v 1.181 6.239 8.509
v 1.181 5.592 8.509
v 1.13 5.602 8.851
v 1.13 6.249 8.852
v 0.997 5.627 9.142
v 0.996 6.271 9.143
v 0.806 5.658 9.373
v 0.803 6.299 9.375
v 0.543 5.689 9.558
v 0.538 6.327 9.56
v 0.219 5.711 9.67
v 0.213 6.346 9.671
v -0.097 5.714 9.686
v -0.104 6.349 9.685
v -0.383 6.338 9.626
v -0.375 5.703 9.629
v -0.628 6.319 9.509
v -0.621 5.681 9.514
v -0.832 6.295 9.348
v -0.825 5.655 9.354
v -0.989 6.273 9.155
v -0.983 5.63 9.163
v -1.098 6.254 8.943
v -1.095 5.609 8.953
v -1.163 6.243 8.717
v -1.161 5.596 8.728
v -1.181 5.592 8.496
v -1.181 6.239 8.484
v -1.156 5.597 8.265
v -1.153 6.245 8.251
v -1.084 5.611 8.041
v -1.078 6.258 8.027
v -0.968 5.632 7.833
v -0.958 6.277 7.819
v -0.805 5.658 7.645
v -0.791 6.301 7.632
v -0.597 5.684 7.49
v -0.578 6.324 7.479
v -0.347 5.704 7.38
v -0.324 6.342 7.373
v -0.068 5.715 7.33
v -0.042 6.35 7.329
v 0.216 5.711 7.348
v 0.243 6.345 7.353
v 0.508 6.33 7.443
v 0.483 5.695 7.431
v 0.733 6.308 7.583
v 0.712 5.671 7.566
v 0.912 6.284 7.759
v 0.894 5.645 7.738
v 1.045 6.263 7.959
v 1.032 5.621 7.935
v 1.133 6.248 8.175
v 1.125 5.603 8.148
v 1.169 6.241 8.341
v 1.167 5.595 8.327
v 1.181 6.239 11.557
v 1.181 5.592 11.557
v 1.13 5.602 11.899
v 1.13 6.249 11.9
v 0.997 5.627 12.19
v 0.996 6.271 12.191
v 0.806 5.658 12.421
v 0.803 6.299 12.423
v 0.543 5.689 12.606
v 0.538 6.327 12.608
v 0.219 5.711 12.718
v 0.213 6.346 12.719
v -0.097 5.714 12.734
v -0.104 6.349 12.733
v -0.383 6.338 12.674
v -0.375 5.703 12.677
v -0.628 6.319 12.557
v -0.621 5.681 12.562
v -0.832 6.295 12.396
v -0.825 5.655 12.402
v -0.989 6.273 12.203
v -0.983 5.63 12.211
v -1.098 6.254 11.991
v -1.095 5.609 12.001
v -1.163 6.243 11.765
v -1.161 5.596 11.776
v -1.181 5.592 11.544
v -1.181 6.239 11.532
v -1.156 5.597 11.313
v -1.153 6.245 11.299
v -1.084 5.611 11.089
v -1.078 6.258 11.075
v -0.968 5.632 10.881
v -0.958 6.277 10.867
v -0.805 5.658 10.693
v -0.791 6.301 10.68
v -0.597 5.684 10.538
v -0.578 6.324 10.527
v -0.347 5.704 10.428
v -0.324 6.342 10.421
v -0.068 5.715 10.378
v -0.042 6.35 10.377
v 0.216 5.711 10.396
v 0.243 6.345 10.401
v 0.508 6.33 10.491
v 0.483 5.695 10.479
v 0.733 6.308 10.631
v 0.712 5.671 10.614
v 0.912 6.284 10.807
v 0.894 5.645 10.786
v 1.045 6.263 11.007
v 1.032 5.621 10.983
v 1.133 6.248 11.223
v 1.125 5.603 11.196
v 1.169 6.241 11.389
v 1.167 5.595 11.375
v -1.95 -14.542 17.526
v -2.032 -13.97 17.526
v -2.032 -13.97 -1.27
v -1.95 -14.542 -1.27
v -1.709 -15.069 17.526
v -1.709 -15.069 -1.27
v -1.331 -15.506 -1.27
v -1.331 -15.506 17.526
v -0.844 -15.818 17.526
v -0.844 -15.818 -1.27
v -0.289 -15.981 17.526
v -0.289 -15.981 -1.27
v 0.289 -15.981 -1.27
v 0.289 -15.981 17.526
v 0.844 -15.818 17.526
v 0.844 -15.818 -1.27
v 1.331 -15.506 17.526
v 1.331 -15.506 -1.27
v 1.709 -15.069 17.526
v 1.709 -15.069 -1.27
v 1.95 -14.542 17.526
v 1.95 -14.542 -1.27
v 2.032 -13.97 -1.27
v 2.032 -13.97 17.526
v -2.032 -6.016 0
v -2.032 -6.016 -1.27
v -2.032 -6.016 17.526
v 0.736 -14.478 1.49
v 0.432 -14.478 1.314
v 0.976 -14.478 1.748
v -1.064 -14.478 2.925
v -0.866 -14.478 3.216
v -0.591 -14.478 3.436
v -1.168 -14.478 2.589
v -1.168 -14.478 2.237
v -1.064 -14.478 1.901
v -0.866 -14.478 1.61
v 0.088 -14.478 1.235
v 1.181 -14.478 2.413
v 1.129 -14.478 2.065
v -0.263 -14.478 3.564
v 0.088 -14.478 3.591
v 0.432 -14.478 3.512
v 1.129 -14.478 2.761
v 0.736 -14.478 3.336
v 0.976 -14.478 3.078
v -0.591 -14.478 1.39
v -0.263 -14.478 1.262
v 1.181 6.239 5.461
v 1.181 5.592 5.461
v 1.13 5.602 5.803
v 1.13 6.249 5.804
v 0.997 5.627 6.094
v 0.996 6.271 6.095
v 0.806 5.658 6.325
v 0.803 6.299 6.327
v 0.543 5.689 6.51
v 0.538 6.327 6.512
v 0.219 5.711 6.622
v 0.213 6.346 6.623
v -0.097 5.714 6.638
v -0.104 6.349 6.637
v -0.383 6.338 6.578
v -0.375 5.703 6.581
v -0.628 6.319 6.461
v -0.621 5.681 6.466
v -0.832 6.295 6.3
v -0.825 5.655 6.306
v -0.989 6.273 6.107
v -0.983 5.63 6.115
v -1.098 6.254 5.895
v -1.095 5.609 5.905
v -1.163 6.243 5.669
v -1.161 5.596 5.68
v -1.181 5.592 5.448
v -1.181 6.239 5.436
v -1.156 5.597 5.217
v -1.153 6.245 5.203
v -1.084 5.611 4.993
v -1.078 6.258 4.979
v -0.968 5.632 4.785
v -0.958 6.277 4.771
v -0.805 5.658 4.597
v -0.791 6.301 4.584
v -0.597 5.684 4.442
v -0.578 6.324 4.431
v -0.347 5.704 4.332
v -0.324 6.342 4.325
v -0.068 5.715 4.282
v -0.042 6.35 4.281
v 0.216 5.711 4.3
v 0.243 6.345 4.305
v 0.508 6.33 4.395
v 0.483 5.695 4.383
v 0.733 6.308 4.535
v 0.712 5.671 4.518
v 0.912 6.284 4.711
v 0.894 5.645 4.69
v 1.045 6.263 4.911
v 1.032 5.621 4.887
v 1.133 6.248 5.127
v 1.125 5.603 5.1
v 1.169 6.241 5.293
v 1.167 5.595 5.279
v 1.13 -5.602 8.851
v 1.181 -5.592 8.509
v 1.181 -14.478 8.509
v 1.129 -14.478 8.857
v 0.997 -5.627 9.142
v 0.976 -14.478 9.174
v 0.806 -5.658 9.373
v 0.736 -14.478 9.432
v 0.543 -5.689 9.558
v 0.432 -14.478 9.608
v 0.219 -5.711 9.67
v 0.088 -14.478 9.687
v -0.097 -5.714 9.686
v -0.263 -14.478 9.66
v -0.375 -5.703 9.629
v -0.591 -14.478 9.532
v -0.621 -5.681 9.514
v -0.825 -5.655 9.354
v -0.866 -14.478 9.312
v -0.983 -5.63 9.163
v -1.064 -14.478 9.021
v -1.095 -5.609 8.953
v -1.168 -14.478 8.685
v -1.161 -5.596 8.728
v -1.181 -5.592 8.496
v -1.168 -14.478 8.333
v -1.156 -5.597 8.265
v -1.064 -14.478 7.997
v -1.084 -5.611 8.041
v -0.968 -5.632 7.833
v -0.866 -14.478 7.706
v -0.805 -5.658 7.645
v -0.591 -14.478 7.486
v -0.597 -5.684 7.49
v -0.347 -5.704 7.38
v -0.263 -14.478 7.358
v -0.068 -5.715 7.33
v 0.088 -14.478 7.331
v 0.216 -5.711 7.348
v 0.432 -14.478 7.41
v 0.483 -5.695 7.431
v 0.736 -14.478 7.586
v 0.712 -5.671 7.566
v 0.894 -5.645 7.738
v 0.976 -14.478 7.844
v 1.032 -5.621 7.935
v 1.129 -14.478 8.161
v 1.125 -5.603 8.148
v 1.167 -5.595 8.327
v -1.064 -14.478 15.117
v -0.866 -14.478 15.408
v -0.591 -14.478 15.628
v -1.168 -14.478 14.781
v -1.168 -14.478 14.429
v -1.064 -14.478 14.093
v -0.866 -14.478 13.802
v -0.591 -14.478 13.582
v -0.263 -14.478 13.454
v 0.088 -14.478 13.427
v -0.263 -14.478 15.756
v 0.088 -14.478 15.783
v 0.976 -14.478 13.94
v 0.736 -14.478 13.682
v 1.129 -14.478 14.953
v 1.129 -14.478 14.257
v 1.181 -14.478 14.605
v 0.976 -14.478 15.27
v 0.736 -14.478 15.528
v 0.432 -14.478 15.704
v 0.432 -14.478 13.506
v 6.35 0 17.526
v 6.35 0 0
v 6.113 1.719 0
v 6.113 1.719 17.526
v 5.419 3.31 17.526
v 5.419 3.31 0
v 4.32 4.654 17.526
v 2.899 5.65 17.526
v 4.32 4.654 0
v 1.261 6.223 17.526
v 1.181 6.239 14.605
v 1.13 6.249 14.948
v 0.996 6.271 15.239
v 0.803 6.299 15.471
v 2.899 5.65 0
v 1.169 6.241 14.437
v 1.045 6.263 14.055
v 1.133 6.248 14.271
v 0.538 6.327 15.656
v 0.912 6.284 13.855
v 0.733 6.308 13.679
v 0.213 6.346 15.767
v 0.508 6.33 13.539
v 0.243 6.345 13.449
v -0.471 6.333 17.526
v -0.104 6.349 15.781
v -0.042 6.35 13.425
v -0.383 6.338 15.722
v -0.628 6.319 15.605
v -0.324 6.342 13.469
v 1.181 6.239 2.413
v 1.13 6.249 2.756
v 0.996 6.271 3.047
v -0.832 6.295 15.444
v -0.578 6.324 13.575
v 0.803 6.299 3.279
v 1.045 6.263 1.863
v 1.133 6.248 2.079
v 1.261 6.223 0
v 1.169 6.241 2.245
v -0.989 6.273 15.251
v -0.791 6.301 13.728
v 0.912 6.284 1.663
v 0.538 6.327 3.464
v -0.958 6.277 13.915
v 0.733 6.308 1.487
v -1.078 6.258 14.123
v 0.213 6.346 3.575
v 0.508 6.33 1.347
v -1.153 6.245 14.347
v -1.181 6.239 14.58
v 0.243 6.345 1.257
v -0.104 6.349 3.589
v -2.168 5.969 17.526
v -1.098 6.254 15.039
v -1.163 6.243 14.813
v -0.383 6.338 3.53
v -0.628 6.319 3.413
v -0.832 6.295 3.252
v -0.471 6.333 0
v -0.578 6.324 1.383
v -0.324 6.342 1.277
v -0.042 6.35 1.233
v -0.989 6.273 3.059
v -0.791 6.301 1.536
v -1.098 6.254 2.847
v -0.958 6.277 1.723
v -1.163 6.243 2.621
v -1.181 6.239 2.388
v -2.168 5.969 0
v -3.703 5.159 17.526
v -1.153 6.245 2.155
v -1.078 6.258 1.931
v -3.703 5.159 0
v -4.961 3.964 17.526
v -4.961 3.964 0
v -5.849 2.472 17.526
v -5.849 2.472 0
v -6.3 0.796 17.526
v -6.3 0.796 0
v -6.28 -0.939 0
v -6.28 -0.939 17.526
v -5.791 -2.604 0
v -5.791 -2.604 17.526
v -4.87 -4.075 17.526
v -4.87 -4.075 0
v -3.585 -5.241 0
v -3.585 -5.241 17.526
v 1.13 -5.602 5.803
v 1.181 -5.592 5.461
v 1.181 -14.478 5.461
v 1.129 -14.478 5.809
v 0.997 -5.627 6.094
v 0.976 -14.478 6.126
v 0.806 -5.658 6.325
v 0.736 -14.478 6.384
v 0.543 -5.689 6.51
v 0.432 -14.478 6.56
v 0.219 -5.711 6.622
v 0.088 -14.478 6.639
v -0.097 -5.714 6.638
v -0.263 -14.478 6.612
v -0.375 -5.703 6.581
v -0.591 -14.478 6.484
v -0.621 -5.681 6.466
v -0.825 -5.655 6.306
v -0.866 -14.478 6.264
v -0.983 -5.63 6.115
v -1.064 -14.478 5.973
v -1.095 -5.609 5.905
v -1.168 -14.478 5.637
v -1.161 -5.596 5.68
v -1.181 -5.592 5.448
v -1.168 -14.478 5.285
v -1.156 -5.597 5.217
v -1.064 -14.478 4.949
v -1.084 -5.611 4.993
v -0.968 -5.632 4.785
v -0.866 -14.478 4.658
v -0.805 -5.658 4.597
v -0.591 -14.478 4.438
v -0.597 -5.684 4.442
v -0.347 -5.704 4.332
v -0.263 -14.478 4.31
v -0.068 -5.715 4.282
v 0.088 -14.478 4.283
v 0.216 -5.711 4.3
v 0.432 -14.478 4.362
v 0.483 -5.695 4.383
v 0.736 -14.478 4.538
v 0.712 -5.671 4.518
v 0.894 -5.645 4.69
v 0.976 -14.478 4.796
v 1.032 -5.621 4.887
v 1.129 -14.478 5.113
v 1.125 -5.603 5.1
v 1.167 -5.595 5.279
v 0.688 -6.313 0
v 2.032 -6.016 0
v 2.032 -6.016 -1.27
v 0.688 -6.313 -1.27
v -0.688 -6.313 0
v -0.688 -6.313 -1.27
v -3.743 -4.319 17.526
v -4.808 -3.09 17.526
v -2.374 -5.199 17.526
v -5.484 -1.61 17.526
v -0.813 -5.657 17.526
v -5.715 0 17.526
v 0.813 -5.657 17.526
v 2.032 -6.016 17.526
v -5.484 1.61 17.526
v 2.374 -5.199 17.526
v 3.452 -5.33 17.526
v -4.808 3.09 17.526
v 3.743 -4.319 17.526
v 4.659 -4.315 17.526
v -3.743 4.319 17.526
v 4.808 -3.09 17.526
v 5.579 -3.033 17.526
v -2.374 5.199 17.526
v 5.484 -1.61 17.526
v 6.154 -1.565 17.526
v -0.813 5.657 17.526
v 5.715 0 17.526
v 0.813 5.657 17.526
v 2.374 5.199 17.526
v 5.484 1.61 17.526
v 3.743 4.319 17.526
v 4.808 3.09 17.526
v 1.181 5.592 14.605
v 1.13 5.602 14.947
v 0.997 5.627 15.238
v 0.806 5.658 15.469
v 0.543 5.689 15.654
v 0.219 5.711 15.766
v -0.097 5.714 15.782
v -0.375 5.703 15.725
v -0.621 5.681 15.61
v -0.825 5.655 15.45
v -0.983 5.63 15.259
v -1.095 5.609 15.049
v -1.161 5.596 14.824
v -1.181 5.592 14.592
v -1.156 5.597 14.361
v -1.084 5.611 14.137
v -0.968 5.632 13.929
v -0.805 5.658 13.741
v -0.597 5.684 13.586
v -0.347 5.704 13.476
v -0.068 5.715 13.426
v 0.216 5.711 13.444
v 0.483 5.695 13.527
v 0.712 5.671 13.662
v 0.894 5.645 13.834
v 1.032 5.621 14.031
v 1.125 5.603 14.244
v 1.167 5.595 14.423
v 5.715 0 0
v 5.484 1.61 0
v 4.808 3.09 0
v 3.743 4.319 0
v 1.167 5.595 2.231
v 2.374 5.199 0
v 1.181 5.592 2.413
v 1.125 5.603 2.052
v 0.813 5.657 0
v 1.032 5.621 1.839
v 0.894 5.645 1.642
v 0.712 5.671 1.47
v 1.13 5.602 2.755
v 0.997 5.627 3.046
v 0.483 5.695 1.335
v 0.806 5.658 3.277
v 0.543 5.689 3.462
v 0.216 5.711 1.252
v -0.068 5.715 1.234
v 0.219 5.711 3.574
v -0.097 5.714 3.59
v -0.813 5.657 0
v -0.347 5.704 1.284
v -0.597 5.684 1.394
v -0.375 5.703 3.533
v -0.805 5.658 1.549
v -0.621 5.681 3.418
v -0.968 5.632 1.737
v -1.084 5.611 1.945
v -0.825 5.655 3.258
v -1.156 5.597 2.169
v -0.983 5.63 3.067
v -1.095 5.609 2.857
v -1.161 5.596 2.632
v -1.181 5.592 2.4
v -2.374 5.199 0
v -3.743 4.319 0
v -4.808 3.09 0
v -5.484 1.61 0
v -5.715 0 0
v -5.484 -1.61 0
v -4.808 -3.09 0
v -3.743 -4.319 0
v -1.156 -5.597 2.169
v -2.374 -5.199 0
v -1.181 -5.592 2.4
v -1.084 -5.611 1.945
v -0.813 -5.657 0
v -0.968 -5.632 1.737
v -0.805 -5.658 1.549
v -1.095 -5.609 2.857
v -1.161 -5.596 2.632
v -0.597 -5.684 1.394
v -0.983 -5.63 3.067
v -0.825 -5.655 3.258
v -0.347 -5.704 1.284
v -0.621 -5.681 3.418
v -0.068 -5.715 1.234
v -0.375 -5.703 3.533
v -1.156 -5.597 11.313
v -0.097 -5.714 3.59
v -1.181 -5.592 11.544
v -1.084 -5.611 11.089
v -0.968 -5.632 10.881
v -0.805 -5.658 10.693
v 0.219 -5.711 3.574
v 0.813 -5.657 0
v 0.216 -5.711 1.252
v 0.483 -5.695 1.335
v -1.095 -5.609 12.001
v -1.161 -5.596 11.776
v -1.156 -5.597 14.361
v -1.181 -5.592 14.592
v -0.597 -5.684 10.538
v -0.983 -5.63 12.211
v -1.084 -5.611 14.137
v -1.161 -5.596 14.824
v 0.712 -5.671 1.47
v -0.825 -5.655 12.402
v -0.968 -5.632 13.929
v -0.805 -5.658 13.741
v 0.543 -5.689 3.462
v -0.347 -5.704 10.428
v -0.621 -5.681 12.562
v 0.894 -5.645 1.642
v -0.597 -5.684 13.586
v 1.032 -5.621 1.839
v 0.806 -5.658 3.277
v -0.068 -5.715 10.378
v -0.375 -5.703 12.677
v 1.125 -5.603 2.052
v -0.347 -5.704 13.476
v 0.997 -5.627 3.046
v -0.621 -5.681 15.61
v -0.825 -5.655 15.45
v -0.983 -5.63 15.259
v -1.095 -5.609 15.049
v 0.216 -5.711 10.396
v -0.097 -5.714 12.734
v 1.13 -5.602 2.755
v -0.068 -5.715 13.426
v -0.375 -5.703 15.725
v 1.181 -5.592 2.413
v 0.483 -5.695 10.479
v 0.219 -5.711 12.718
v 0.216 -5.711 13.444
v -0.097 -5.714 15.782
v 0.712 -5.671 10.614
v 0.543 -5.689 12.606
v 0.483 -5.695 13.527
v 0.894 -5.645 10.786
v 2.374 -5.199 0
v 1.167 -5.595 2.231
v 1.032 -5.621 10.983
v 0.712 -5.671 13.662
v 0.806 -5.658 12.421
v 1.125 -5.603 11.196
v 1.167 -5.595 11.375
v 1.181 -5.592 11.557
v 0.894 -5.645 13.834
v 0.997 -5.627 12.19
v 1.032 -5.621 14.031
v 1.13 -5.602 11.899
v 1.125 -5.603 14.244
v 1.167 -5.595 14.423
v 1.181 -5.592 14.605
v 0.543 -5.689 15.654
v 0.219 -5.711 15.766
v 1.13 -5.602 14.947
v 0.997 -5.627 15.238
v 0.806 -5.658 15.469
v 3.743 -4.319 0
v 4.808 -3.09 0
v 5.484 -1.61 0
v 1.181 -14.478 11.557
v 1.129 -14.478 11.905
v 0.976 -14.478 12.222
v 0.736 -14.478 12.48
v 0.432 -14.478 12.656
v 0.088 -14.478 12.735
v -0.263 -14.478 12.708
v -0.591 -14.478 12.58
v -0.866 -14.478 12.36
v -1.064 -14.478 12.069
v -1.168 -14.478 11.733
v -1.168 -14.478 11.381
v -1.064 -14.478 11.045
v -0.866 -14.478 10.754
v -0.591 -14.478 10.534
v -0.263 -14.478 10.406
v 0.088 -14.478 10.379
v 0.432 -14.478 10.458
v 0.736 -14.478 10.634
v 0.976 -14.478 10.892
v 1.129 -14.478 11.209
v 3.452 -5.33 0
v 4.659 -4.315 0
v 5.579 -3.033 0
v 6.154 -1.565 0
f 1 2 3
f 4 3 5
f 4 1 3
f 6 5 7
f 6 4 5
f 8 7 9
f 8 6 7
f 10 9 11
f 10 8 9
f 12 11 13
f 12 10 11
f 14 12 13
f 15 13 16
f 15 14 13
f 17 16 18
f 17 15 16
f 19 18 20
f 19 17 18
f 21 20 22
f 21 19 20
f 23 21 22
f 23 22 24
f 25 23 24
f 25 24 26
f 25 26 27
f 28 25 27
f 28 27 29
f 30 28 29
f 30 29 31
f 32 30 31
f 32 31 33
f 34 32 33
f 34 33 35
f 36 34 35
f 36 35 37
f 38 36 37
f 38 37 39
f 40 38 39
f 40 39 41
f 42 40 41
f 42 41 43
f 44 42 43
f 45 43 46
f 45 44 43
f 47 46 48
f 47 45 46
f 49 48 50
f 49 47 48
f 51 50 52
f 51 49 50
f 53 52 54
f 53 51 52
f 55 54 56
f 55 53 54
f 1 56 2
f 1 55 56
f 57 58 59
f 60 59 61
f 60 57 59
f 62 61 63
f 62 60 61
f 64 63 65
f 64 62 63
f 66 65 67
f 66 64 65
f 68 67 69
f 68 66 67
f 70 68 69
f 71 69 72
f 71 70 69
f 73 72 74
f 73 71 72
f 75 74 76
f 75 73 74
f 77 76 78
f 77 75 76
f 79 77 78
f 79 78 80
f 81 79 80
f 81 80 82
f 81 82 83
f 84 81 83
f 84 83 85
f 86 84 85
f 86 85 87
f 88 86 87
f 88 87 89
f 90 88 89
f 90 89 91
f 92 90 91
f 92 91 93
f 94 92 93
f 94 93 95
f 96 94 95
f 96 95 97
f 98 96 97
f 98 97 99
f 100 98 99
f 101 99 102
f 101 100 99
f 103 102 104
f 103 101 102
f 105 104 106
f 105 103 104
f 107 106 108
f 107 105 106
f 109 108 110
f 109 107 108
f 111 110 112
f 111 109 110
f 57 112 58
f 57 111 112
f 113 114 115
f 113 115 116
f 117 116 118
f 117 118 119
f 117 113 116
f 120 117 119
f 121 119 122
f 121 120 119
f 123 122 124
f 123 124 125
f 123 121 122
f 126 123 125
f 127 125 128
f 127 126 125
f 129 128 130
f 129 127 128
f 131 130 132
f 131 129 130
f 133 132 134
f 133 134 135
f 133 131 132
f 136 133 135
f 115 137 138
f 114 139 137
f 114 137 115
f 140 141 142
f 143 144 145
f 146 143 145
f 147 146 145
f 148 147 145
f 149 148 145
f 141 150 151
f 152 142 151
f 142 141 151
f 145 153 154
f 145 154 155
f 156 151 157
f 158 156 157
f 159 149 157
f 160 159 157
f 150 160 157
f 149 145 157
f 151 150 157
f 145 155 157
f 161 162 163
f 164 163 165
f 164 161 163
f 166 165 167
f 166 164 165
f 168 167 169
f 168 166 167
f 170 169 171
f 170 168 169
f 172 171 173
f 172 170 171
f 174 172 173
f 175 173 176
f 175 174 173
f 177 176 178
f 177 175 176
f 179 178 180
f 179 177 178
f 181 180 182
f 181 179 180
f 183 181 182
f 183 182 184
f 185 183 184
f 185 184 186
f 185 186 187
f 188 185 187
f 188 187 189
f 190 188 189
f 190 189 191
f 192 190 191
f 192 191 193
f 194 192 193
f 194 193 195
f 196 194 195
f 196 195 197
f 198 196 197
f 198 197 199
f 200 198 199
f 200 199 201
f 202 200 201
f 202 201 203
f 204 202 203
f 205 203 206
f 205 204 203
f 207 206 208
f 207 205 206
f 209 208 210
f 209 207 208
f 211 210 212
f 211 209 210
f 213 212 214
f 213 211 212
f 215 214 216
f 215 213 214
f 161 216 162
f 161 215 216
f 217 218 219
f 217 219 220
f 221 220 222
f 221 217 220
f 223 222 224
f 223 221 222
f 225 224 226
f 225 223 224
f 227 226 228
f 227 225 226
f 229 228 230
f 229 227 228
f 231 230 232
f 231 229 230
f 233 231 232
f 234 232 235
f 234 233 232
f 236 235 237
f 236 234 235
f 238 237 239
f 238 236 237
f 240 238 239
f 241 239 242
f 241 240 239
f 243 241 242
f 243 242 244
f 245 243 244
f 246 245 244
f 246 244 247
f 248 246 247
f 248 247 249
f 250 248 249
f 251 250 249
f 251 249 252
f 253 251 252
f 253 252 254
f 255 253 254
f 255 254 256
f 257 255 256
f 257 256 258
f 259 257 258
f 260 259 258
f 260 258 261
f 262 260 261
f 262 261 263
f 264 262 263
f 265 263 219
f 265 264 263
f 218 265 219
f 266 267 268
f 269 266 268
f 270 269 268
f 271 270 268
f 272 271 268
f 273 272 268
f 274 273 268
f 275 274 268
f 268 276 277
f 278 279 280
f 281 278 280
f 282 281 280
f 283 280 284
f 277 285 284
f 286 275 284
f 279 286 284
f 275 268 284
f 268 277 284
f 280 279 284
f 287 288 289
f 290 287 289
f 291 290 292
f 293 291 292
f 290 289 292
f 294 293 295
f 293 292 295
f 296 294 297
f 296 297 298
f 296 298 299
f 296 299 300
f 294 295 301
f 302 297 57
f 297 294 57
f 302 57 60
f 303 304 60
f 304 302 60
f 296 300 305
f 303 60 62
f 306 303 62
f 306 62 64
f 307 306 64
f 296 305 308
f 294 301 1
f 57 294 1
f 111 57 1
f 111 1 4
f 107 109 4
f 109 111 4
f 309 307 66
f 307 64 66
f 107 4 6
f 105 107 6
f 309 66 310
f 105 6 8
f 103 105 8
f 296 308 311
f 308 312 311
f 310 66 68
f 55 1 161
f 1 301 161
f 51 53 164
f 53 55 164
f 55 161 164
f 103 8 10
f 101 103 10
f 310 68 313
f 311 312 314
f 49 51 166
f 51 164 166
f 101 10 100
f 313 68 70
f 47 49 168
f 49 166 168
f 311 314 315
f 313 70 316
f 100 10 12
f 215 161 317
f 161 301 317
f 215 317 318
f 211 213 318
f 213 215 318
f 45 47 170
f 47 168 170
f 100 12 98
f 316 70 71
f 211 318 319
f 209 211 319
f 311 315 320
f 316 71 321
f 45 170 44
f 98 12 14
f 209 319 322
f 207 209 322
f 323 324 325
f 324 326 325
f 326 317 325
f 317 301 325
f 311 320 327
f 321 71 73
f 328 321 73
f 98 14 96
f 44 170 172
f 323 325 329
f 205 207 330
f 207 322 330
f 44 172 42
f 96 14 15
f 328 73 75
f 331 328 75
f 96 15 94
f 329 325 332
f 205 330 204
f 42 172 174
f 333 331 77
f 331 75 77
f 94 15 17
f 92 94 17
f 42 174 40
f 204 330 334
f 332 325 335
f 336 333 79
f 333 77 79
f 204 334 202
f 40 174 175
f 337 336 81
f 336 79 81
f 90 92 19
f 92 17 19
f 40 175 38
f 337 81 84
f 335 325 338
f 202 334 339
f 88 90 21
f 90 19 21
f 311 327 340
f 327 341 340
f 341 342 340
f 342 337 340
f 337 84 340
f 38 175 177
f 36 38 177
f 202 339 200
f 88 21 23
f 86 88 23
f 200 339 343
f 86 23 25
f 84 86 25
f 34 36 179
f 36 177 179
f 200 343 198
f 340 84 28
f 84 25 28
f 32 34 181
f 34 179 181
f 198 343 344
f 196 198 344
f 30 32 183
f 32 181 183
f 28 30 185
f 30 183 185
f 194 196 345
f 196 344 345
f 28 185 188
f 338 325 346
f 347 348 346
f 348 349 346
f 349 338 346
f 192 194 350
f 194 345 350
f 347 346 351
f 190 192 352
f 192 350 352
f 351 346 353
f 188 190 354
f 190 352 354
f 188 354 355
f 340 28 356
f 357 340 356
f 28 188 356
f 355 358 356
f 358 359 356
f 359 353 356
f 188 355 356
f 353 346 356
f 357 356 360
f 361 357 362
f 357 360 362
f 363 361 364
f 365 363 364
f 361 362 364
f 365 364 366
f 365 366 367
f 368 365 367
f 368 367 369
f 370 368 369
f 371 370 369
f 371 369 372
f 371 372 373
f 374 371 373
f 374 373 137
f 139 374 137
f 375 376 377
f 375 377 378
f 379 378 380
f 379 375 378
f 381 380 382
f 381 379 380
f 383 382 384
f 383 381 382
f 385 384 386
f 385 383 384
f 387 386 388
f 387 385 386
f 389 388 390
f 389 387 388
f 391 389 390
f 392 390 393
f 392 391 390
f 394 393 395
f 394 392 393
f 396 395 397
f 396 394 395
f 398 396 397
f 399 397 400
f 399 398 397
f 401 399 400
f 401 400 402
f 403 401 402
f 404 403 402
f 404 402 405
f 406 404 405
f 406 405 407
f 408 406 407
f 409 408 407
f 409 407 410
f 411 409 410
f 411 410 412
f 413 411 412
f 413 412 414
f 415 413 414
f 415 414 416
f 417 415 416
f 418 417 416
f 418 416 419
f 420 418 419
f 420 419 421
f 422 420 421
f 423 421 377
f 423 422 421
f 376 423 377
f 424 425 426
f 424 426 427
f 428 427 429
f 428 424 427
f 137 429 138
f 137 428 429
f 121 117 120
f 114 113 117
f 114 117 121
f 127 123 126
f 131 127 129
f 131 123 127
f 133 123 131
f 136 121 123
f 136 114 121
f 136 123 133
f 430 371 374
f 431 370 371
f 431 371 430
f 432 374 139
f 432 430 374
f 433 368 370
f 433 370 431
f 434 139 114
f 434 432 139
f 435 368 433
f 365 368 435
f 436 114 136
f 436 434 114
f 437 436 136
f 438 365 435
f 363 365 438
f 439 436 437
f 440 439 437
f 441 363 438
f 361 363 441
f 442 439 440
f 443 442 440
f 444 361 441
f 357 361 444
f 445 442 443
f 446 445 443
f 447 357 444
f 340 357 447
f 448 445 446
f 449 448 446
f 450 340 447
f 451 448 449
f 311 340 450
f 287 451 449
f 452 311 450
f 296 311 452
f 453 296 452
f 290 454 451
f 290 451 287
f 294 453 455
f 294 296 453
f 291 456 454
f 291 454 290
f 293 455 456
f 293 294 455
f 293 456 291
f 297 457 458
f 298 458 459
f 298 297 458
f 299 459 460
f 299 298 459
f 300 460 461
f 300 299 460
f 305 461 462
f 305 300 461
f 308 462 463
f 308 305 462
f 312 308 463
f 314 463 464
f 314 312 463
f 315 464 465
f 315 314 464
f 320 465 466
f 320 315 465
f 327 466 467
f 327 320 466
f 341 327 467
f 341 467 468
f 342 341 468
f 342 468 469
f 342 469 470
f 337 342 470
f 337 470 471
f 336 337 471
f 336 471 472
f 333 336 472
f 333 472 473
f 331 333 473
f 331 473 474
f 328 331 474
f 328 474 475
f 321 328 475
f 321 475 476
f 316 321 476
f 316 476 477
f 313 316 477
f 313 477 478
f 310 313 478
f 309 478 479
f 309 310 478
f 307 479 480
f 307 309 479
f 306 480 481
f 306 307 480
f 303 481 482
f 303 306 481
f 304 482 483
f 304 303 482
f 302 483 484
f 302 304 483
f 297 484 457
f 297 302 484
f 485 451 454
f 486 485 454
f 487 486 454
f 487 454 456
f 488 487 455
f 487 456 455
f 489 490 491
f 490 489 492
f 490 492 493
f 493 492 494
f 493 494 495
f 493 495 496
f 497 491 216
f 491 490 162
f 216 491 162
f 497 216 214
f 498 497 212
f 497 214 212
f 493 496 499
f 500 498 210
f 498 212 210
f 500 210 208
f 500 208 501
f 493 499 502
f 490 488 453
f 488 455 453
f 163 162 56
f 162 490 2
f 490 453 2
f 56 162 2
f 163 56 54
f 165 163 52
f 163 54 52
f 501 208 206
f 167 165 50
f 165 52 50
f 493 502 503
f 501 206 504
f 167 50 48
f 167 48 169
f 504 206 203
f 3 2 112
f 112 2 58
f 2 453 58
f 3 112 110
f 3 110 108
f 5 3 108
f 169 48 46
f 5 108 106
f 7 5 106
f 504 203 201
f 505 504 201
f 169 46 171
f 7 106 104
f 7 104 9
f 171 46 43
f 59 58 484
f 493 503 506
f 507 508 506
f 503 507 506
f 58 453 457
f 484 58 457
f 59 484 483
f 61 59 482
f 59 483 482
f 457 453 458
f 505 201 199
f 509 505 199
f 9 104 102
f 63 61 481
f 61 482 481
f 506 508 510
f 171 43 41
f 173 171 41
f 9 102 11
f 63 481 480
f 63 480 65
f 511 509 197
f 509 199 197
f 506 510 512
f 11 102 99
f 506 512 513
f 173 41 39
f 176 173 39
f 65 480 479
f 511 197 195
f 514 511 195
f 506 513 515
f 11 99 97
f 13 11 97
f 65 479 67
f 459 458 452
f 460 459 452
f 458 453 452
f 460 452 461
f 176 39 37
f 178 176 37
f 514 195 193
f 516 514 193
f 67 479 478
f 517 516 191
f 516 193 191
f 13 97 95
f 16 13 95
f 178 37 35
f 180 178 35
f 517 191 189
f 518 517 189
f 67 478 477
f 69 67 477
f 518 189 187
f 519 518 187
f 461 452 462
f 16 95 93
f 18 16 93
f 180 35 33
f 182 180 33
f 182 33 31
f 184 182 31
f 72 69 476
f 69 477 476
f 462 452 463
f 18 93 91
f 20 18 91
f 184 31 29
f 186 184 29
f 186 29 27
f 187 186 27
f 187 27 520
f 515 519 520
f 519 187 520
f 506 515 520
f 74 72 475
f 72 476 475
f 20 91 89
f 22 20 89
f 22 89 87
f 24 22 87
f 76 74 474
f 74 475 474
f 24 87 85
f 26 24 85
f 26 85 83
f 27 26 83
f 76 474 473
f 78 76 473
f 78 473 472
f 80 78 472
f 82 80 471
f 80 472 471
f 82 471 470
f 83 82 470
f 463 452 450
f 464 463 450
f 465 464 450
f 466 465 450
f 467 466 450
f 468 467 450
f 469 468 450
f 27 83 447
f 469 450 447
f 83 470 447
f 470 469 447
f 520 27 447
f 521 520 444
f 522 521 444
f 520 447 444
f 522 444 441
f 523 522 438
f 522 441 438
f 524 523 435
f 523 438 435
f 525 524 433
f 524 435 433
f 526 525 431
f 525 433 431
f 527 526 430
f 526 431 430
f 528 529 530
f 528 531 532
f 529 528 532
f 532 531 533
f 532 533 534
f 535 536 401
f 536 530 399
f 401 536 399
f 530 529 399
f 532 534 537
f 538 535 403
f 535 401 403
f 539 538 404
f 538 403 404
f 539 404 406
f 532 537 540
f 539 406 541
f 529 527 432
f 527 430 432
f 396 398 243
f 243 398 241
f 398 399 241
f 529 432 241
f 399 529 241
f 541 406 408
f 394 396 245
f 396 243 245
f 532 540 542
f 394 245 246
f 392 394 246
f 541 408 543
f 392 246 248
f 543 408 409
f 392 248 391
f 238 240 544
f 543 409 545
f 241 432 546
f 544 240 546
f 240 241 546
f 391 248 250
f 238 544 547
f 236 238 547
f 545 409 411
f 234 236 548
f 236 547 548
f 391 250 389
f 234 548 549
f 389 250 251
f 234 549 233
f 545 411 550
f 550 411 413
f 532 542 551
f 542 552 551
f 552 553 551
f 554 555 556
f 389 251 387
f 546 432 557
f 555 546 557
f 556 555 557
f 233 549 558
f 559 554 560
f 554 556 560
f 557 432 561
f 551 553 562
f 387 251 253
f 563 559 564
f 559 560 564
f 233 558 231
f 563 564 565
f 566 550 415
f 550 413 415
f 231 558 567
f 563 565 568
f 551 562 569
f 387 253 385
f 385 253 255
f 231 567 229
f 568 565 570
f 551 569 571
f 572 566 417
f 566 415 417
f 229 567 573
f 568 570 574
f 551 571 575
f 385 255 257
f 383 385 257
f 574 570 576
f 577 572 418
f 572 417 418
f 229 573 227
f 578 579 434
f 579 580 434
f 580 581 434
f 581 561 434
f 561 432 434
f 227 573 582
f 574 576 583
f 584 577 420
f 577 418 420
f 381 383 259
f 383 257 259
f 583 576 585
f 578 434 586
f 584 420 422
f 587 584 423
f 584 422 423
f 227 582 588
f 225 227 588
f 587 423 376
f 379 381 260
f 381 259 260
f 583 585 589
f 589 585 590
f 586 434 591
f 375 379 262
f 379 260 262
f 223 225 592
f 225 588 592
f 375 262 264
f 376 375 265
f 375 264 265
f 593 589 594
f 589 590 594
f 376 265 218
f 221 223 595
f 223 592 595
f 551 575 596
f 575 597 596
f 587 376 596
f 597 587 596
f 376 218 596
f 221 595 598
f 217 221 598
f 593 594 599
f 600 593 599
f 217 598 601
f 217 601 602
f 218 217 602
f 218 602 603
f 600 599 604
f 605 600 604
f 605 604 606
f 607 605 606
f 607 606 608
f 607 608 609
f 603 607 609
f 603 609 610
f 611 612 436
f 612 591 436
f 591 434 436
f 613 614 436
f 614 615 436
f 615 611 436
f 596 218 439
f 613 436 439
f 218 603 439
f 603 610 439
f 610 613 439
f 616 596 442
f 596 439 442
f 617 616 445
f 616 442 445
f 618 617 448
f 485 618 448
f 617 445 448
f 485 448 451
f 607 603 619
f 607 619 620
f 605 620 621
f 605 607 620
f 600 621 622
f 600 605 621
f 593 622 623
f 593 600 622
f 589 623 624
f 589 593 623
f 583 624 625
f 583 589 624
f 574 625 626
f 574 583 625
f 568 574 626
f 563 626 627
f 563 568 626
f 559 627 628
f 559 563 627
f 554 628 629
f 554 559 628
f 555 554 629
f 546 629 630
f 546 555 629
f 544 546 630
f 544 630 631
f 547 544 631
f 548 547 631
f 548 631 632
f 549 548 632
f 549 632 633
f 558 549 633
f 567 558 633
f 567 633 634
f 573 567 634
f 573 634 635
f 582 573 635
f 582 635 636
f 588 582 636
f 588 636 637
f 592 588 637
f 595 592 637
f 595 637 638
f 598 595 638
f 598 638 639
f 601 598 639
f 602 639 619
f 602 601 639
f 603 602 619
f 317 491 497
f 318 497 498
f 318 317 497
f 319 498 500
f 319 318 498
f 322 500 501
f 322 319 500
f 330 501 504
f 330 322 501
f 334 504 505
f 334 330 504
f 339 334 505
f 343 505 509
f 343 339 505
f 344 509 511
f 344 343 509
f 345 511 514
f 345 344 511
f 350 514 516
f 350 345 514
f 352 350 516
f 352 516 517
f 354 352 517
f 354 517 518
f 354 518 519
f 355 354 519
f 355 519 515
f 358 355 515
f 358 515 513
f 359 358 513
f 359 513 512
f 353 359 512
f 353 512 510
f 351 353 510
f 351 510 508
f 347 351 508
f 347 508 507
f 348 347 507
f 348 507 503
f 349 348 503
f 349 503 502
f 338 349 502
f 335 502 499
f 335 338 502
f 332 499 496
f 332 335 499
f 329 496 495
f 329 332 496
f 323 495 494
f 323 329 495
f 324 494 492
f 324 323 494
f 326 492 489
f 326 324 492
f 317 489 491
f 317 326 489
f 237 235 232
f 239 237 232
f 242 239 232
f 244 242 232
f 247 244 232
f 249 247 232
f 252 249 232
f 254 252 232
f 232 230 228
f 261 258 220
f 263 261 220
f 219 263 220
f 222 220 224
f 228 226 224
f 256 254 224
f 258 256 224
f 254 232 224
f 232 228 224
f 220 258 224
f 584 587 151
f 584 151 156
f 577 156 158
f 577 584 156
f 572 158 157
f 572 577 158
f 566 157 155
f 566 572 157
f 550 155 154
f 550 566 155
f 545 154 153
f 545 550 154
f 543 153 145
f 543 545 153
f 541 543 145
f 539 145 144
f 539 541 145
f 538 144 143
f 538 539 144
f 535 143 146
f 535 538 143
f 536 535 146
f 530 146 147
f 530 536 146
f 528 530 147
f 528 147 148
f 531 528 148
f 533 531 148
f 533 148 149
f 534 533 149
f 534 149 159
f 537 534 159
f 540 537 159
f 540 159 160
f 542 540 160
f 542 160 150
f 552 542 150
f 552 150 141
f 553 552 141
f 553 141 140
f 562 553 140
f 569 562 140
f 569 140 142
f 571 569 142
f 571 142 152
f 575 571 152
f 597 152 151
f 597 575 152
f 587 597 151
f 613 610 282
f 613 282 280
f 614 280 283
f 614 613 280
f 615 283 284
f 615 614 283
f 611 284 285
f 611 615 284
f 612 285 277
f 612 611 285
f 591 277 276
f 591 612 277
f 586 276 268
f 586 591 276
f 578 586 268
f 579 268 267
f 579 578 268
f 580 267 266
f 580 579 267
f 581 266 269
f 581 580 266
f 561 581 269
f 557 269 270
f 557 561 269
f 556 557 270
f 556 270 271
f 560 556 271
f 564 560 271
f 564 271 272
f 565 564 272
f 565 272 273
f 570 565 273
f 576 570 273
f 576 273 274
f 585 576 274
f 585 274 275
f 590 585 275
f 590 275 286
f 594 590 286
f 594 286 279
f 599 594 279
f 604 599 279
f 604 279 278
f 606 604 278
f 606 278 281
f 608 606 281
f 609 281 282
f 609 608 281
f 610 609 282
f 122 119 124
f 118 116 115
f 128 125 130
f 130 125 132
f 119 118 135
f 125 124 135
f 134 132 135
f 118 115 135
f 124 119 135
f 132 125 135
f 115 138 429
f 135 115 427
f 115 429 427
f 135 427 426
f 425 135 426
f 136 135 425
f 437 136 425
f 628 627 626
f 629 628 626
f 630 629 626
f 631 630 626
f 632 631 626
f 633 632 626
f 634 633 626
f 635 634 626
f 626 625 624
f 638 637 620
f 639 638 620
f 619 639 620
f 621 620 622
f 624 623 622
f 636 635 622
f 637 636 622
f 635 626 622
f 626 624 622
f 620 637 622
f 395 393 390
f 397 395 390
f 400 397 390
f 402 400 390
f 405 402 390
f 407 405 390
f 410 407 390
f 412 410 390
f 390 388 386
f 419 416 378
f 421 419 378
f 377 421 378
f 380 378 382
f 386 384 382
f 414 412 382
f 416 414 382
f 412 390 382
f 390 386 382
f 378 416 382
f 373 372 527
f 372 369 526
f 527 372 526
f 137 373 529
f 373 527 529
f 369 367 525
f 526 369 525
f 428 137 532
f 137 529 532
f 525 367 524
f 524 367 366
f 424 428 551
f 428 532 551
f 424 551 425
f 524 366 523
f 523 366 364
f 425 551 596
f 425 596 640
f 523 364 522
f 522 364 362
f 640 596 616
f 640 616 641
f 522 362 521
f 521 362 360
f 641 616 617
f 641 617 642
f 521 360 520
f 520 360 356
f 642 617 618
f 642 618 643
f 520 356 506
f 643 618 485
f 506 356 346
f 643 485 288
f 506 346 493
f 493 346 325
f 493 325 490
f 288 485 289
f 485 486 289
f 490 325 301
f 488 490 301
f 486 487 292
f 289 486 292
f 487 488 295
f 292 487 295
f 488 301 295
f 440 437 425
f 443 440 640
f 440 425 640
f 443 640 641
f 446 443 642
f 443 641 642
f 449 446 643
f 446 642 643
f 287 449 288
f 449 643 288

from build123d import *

# Parameters (mm, degrees)
F1_DEPTH = 17.526
F2_DEPTH = 1.27
F3_R     = 5.715
F4_DEPTH = 17.526
F6_R     = 1.1811
F7_DEPTH = 20.828


with BuildPart() as f1:
    # F0 (on Top) → F1 (new body)
    with BuildSketch(Plane.XY):
        with BuildLine():
            ThreePointArc((2.032, -6.016101), (5.158764, -3.702654), (6.35, 0))
            ThreePointArc((6.35, 0), (-3.702654, 5.158764), (-2.032, -6.016101))
            ThreePointArc((-2.032, -6.016101), (0, -6.35), (2.032, -6.016101))
        make_face()
        with BuildLine():
            ThreePointArc((2.032, -6.016101), (0, -6.35), (-2.032, -6.016101))
            Line((-2.032, -6.016101), (-2.032, -13.97))
            ThreePointArc((-2.032, -13.97), (0, -16.002), (2.032, -13.97))
            Line((2.032, -13.97), (2.032, -6.016101))
        make_face()
    extrude(amount=F1_DEPTH)

    # F0 (on Top) → F2 (join)
    with BuildSketch(Plane.XY):
        with BuildLine():
            ThreePointArc((2.032, -6.016101), (0, -6.35), (-2.032, -6.016101))
            Line((-2.032, -6.016101), (-2.032, -13.97))
            ThreePointArc((-2.032, -13.97), (0, -16.002), (2.032, -13.97))
            Line((2.032, -13.97), (2.032, -6.016101))
        make_face()
    extrude(amount=-F2_DEPTH)

    # F3 (on face) → F4 (cut, through all)
    with BuildSketch(Plane.XY.offset(17.526)):
        Circle(F3_R)
    extrude(amount=-F4_DEPTH, mode=Mode.SUBTRACT)

    # F6 (on offset) → F7 (cut)
    with BuildSketch(Plane.XZ.offset(-6.35)):
        with Locations((0, 2.413)):
            Circle(F6_R)
        with Locations((0, 5.461)):
            Circle(F6_R)
        with Locations((0, 8.509)):
            Circle(F6_R)
        with Locations((0, 11.557)):
            Circle(F6_R)
        with Locations((0, 14.605)):
            Circle(F6_R)
    extrude(amount=F7_DEPTH, mode=Mode.SUBTRACT)


solid = f1.part
